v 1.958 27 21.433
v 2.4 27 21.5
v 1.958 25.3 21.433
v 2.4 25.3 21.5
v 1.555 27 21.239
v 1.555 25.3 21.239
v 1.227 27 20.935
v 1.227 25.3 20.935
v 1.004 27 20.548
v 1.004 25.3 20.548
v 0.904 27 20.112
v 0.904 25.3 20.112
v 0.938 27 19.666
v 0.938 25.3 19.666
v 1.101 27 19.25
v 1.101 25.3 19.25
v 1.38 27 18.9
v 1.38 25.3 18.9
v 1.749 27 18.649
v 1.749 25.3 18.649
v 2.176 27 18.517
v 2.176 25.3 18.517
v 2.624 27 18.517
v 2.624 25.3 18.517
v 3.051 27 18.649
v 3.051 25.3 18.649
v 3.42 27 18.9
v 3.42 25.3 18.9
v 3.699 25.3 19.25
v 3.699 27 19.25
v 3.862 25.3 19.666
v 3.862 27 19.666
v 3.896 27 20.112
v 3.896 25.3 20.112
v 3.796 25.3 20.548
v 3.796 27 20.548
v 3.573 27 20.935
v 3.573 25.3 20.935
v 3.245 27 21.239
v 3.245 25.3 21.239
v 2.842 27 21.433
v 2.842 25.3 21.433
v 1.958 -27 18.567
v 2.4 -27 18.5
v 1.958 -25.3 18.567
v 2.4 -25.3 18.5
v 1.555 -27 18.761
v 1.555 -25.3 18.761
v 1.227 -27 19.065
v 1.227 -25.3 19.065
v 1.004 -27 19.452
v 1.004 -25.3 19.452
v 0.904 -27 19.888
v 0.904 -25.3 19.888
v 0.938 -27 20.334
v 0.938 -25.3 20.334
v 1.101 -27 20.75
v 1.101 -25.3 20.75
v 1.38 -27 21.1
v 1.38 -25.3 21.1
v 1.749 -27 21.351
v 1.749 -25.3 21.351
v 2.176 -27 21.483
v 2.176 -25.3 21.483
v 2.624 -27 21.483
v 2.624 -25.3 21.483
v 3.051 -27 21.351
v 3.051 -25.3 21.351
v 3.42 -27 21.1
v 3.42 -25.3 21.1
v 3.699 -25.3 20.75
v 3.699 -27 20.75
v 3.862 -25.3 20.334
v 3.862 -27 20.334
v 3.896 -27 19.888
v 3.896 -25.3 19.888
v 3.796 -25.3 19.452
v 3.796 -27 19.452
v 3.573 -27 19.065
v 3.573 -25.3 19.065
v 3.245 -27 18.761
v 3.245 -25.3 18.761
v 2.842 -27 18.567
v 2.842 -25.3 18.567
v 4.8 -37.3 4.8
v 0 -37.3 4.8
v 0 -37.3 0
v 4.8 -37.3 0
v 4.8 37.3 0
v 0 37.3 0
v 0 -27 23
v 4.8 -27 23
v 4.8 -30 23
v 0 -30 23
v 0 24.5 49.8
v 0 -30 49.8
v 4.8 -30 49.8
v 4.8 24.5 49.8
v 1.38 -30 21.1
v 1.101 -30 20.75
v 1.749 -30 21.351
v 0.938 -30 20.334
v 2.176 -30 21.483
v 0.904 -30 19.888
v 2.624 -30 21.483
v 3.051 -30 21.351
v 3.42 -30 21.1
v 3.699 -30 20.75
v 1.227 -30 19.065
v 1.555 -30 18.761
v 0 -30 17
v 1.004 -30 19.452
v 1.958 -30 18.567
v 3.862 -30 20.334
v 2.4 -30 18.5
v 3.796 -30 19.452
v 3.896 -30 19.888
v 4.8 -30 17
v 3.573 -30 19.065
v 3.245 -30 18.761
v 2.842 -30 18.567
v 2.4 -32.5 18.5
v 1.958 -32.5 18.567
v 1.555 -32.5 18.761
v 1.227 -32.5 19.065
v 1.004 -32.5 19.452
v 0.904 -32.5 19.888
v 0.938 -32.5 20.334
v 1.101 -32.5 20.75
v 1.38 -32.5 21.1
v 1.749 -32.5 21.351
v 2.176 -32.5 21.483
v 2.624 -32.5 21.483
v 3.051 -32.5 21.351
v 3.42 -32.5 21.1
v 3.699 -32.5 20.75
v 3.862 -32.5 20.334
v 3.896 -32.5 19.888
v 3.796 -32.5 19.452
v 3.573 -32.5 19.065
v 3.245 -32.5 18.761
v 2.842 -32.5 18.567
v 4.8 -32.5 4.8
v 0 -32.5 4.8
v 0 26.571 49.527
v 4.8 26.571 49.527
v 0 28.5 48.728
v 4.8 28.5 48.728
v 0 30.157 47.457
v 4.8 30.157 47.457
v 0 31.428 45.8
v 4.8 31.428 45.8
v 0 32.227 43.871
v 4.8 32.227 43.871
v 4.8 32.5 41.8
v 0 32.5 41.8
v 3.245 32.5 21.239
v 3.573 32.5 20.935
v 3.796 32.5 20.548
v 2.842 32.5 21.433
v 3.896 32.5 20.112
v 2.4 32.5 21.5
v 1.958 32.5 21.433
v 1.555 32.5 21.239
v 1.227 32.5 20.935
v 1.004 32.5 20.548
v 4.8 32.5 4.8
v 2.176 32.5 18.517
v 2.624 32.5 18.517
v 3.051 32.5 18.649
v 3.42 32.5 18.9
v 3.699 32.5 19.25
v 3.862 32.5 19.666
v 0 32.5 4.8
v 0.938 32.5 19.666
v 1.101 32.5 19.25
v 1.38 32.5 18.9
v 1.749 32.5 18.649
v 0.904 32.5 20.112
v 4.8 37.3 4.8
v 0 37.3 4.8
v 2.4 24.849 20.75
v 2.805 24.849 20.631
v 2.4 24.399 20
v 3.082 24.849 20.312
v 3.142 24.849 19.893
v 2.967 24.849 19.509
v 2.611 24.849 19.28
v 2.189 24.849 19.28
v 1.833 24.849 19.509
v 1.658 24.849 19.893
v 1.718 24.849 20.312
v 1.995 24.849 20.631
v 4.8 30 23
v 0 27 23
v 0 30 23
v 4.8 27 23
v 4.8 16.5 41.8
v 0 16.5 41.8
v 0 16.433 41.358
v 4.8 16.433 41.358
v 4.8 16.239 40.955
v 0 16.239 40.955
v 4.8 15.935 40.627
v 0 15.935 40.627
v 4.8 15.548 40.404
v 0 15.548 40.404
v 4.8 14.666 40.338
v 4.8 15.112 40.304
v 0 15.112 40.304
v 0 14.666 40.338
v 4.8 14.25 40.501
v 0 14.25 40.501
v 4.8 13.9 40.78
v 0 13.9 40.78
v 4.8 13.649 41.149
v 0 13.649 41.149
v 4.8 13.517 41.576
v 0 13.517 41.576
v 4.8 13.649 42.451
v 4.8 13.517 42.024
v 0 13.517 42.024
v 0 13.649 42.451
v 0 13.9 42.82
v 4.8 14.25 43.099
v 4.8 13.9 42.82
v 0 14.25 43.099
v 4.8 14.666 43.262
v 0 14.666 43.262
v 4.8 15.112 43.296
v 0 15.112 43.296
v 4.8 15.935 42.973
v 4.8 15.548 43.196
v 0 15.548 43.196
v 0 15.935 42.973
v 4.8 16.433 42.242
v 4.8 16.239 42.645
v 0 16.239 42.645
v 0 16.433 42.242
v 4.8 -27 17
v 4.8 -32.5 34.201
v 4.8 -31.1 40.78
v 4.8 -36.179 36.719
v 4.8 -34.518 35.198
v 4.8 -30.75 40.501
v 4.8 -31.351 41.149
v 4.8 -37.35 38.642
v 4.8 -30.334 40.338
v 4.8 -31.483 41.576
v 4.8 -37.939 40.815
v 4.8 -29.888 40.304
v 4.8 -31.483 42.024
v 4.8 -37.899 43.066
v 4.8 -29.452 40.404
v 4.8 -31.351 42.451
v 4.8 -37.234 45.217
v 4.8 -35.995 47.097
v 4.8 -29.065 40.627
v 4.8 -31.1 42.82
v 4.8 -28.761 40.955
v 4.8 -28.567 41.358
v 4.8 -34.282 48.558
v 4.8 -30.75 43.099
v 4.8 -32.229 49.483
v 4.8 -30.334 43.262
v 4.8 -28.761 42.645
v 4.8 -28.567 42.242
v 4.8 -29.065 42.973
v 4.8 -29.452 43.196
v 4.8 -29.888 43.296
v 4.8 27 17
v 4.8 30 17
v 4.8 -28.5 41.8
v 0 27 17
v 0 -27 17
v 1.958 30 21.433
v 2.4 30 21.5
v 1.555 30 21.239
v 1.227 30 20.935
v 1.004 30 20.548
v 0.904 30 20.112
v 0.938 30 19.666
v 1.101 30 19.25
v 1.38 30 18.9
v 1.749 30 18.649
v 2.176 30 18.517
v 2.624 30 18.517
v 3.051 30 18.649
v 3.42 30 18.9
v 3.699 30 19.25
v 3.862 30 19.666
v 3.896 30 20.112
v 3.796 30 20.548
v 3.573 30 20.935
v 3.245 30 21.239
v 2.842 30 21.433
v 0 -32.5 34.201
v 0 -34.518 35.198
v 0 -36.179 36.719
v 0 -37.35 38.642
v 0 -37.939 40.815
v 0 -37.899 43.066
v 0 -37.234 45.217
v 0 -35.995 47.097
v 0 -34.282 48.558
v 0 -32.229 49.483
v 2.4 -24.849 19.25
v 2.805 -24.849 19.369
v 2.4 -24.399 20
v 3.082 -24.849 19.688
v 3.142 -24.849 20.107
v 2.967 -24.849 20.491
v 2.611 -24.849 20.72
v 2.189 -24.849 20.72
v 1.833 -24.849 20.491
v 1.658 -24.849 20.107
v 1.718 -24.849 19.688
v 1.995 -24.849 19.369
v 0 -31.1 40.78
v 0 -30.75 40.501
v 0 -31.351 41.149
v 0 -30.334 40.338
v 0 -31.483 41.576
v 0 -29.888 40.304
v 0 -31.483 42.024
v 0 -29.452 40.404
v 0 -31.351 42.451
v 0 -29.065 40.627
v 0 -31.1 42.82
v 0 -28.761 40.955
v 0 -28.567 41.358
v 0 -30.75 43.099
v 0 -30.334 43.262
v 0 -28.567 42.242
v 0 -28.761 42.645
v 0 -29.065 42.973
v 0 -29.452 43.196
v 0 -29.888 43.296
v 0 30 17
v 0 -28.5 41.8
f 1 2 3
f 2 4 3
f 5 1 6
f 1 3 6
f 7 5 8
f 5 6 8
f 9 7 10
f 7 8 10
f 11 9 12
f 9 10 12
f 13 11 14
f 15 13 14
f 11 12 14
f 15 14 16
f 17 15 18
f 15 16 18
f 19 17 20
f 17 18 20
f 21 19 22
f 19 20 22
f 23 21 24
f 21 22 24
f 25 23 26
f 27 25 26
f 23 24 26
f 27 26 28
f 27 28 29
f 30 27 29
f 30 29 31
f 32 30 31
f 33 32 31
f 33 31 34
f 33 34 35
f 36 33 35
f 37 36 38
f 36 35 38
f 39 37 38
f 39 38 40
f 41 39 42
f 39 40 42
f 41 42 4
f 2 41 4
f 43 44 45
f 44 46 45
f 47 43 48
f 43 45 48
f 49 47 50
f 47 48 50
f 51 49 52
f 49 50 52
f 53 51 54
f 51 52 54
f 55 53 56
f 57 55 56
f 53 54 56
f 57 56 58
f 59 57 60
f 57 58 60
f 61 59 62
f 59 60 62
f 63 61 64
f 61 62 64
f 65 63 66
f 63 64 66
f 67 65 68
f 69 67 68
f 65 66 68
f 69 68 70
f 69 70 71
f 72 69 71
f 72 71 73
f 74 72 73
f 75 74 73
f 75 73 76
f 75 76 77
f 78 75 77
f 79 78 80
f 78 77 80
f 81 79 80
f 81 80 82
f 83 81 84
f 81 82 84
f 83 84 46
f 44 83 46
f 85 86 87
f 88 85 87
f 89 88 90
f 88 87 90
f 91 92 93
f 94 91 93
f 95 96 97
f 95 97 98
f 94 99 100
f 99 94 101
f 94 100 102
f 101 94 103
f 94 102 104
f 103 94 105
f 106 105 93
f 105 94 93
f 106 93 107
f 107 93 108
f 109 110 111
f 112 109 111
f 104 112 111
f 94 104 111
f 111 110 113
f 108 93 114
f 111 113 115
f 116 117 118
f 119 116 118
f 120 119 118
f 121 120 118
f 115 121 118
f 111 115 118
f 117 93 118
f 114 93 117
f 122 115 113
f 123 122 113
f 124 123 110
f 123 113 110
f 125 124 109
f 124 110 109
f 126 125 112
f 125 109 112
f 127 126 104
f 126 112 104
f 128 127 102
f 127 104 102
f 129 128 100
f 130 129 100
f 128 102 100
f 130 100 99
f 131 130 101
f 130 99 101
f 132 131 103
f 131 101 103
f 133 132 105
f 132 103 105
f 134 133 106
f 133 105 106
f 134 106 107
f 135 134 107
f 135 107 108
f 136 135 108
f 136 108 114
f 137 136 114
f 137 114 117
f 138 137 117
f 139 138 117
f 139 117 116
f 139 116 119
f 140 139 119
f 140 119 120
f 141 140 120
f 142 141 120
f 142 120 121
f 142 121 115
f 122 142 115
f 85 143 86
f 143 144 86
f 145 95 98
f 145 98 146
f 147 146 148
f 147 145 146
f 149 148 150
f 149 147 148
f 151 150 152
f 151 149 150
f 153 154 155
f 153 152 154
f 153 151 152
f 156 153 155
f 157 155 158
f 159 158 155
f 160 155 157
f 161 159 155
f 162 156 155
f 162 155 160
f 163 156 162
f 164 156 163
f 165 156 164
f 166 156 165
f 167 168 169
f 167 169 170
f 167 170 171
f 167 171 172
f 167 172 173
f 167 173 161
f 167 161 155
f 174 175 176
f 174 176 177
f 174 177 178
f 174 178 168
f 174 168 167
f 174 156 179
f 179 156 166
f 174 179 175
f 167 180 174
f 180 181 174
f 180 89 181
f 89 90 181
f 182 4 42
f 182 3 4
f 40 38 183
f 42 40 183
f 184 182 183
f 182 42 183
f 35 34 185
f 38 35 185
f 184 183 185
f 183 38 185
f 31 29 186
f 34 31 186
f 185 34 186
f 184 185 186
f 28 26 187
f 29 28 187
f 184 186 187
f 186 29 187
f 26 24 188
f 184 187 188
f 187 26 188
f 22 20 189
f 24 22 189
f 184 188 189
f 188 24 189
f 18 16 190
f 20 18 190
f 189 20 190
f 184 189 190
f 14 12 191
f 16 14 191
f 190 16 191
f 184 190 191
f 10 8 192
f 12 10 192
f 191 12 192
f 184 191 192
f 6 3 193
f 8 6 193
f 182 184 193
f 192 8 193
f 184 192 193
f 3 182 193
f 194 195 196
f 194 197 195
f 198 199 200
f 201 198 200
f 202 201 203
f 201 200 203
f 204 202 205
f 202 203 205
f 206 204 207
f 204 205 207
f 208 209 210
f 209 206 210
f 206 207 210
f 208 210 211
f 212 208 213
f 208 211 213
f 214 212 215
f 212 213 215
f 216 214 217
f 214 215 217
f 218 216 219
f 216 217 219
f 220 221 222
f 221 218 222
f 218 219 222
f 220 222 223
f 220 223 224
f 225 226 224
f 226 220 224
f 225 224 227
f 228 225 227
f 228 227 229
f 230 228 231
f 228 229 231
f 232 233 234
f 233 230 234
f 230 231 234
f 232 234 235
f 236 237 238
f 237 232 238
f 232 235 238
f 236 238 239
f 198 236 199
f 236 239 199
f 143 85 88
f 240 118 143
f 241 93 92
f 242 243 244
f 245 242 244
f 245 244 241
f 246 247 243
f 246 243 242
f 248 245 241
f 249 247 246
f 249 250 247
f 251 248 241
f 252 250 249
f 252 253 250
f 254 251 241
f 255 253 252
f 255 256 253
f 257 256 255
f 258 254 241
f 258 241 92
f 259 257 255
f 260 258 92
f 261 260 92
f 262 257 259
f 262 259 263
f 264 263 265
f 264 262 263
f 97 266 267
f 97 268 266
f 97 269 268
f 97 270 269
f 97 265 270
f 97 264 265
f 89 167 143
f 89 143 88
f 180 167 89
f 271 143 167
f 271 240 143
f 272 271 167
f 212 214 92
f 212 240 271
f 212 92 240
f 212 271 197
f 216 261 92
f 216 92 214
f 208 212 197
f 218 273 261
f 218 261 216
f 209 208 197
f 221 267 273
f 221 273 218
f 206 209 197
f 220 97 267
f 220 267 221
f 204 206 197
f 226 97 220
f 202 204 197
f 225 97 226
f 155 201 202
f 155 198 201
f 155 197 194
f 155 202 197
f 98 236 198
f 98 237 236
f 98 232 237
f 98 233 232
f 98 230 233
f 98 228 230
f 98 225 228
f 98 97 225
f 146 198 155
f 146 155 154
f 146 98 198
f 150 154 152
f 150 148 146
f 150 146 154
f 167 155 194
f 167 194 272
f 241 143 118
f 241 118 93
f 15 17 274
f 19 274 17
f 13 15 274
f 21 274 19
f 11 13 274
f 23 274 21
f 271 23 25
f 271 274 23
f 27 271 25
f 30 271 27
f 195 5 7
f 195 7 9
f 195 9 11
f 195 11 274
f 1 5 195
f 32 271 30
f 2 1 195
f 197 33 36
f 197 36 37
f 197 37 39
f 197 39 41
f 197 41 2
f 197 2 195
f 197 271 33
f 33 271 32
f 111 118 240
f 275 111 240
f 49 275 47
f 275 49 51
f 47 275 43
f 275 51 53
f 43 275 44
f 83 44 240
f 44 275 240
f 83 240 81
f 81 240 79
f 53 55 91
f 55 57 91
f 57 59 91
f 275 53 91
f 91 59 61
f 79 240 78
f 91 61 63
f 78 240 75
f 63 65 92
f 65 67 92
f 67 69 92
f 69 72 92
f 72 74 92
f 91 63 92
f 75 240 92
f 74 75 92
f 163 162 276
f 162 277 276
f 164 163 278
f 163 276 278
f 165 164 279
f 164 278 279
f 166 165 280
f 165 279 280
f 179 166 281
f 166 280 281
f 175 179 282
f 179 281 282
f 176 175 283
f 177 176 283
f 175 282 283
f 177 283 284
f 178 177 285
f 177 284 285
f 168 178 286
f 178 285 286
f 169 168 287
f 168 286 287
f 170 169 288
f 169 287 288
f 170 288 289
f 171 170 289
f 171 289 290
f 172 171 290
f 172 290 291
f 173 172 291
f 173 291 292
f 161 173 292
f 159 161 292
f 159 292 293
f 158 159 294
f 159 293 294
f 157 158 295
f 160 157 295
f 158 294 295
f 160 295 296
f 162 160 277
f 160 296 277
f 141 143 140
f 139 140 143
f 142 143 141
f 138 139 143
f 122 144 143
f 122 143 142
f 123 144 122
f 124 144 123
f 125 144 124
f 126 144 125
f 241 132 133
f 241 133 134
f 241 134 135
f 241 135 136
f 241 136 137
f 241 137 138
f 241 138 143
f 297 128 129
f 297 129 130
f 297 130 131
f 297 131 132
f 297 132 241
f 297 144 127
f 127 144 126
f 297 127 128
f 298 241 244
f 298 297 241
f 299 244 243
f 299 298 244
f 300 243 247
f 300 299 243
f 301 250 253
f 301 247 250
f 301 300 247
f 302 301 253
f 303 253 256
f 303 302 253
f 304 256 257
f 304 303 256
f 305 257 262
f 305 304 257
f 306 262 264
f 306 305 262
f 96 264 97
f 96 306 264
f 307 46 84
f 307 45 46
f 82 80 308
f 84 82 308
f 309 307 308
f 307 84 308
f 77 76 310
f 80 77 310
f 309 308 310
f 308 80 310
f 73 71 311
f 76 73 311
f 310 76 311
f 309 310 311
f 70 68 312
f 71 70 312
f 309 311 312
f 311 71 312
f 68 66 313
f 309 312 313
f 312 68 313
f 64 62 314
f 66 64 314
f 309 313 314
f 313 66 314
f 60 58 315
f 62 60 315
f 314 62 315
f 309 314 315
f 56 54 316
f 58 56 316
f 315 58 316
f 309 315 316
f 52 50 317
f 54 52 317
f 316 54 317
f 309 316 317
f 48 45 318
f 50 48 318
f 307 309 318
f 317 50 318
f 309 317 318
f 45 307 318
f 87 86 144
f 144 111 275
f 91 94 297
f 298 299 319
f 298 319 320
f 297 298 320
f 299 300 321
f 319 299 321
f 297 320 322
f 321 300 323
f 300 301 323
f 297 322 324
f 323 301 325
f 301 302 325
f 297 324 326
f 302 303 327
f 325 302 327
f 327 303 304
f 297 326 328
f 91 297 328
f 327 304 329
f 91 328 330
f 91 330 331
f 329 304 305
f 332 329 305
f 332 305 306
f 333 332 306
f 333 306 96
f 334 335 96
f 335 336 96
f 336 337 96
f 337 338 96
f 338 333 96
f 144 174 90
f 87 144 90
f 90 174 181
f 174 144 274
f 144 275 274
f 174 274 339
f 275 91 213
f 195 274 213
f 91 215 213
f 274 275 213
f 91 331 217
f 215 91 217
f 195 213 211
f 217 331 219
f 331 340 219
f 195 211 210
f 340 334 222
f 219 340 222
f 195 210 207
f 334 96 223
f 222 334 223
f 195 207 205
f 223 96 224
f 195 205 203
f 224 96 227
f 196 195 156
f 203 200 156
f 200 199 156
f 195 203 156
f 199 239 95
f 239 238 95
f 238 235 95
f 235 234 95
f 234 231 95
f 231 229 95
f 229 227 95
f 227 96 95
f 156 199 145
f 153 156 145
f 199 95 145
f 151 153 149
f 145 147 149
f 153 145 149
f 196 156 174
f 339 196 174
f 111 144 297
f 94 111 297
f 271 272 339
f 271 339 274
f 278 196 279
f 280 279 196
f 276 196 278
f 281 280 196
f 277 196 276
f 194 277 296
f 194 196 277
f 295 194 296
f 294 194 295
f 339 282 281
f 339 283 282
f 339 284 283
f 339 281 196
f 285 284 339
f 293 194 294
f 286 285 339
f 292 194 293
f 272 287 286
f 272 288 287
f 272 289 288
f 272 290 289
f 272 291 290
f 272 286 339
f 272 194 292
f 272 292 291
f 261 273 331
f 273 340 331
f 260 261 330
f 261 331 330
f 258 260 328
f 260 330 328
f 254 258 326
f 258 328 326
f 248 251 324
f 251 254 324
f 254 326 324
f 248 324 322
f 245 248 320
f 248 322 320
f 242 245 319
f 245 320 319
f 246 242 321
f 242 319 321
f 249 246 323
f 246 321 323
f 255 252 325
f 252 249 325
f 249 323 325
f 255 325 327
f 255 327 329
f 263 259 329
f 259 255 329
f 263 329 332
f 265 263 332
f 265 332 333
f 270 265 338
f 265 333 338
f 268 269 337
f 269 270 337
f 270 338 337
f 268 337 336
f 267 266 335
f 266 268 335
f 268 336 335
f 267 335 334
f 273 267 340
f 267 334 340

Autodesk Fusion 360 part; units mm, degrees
sketch "Sketch1" plane through (0, 0, 0) normal (1, 0, 0) x (0, 1, 0)
  line L0 (-32.5, 4.8) -> (-37.3, 4.8)
  line L1 (-37.3, 4.8) -> (-37.3, 0)
  line L2 (-37.3, 0) -> (37.3, 0)
  line L3 (37.3, 0) -> (37.3, 4.8)
  line L4 (37.3, 4.8) -> (32.5, 4.8)
  line L5 (-32.5, 4.8) -> (-32.5, 34.2007)
  line L6 (-30, 49.8) -> (24.5, 49.8)
  line L7 (32.5, 41.8) -> (32.5, 4.8)
  line L8 (-30, 41.8) -> (15, 41.8) construction
  circle A0 centre (-30, 41.8) radius 1.5
  line L9 (15, 41.8) -> (24.5, 41.8) construction
  arc A1 (24.5, 49.8) -> (32.5, 41.8) centre (24.5, 41.8) ccw construction
  arc A2 (32.5, 41.8) -> (24.5, 49.8) centre (24.5, 41.8) ccw
  line L10 (24.5, 49.8) -> (32.5, 49.8) construction
  line L11 (32.5, 49.8) -> (32.5, 41.8) construction
  circle A3 centre (15, 41.8) radius 1.5
  circle A4 centre (-25, 41.8) radius 5 construction
  circle A5 centre (25, 41.8) radius 5 construction
  line L12 (-25, 41.8) -> (25, 41.8) construction
  line L13 (0, 41.8) -> (0, 0) construction
  arc A6 (-32.5, 34.2007) -> (-30, 49.8) centre (-30, 41.8) ccw construction
  arc A7 (-30, 49.8) -> (-32.5, 34.2007) centre (-30, 41.8) ccw
  point P0 (0, 41.8)
  dimension "d1" = 4.8
  dimension "d2" = 4.8
  dimension "d3" = 74.6
  dimension "d4" = 4.8
  dimension "d5" = 4.8
  dimension "d6" = 45
  dimension "d8" = 45
  dimension "d9" = 8
  dimension "d11" = 3
  dimension "d12" = 16
  dimension "d13" = 3
  dimension "d14" = 10
  dimension "d15" = 10
  dimension "d16" = 50
  dimension "d17" = 10
extrude "Extrude1" add sketch "Sketch1" along normal blind 4.8
sketch "Sketch2" plane through (0, -32.5, 0) normal (0, -1, 0) x (1, 0, 0)
  line L0 (0, 34.2007) -> (0, 4.8)
  line L1 (0, 4.8) -> (4.8, 4.8)
  line L2 (4.8, 4.8) -> (4.8, 34.2007)
  line L3 (4.8, 34.2007) -> (0, 34.2007)
  line L4 (0, 4.8) -> (0, 0)
  line L5 (0, 0) -> (4.8, 0)
  line L6 (4.8, 0) -> (4.8, 4.8)
  line L7 (4.8, 4.8) -> (0, 4.8)
  circle A0 centre (2.4, 20) radius 1.5
  dimension "d20" = 3
  dimension "d21" = 20
  dimension "d22" = 2.4
hole "Hole1" at (2.4, -32.5, 20) direction (0, 1, 0) diameter 3 depth 7.2 tip angle 118
sketch "Sketch3" plane through (0, 32.5, 0) normal (0, 1, 0) x (-1, 0, 0)
  line L0 (0, 4.8) -> (0, 41.8)
  line L1 (0, 41.8) -> (-4.8, 41.8)
  line L2 (-4.8, 41.8) -> (-4.8, 4.8)
  line L3 (-4.8, 4.8) -> (0, 4.8)
  line L4 (0, 0) -> (0, 4.8)
  line L5 (0, 4.8) -> (-4.8, 4.8)
  line L6 (-4.8, 4.8) -> (-4.8, 0)
  line L7 (-4.8, 0) -> (0, 0)
  circle A0 centre (-2.4, 20) radius 1.5
  dimension "d26" = 3
  dimension "d27" = 20
  dimension "d28" = 2.4
hole "Hole2" at (2.4, 32.5, 20) direction (0, -1, 0) diameter 3 depth 7.2 tip angle 118
sketch "Sketch4" plane through (4.8, 0, 0) normal (1, 0, 0) x (0, 1, 0)
  circle A0 centre (15, 41.8) radius 1.5
  circle A1 centre (-30, 41.8) radius 1.5
  arc A2 (32.5, 41.8) -> (24.5, 49.8) centre (24.5, 41.8) ccw
  line L0 (24.5, 49.8) -> (-30, 49.8)
  arc A3 (-30, 49.8) -> (-32.5, 34.2007) centre (-30, 41.8) ccw
  line L1 (-32.5, 34.2007) -> (-32.5, 4.8)
  line L2 (-32.5, 4.8) -> (-37.3, 4.8)
  line L3 (-37.3, 4.8) -> (-37.3, 0)
  line L4 (-37.3, 0) -> (37.3, 0)
  line L5 (37.3, 0) -> (37.3, 4.8)
  line L6 (37.3, 4.8) -> (32.5, 4.8)
  line L7 (32.5, 4.8) -> (32.5, 41.8)
  line L8 (-32.5, 18.5) -> (-25.3, 18.5) construction
  line L9 (-25.3, 18.5) -> (-25.3, 21.5) construction
  line L10 (-25.3, 21.5) -> (-32.5, 21.5) construction
  line L11 (32.5, 21.5) -> (25.3, 21.5) construction
  line L12 (25.3, 21.5) -> (25.3, 18.5) construction
  line L13 (25.3, 18.5) -> (32.5, 18.5) construction
  line L14 (-25.3, 20) -> (25.3, 20) construction
  line L15 (-30, 17) -> (-27, 17)
  line L16 (-27, 17) -> (-27, 23)
  line L17 (-27, 23) -> (-30, 23)
  line L18 (-30, 23) -> (-30, 17)
  line L19 (-25.3, 20) -> (-27, 20) construction
  line L20 (27, 23) -> (30, 23)
  line L21 (30, 23) -> (30, 17)
  line L22 (30, 17) -> (27, 17)
  line L23 (27, 17) -> (27, 23)
  line L24 (27, 20) -> (25.3, 20) construction
  point P0 (-25.3, 20)
  point P1 (25.3, 20)
  point P2 (-27, 20)
  point P3 (27, 20)
  dimension "d32" = 7.2
  dimension "d33" = 3
  dimension "d34" = 7.2
  dimension "d35" = 3
  dimension "d36" = 20
  dimension "d37" = 3
  dimension "d38" = 6
  dimension "d39" = 2.5
  dimension "d40" = 3
  dimension "d41" = 6
  dimension "d42" = 2.5
extrude "Extrude2" cut sketch "Sketch4" against normal through all contours L15 L16 L17 L18 | L20 L21 L22 L23
